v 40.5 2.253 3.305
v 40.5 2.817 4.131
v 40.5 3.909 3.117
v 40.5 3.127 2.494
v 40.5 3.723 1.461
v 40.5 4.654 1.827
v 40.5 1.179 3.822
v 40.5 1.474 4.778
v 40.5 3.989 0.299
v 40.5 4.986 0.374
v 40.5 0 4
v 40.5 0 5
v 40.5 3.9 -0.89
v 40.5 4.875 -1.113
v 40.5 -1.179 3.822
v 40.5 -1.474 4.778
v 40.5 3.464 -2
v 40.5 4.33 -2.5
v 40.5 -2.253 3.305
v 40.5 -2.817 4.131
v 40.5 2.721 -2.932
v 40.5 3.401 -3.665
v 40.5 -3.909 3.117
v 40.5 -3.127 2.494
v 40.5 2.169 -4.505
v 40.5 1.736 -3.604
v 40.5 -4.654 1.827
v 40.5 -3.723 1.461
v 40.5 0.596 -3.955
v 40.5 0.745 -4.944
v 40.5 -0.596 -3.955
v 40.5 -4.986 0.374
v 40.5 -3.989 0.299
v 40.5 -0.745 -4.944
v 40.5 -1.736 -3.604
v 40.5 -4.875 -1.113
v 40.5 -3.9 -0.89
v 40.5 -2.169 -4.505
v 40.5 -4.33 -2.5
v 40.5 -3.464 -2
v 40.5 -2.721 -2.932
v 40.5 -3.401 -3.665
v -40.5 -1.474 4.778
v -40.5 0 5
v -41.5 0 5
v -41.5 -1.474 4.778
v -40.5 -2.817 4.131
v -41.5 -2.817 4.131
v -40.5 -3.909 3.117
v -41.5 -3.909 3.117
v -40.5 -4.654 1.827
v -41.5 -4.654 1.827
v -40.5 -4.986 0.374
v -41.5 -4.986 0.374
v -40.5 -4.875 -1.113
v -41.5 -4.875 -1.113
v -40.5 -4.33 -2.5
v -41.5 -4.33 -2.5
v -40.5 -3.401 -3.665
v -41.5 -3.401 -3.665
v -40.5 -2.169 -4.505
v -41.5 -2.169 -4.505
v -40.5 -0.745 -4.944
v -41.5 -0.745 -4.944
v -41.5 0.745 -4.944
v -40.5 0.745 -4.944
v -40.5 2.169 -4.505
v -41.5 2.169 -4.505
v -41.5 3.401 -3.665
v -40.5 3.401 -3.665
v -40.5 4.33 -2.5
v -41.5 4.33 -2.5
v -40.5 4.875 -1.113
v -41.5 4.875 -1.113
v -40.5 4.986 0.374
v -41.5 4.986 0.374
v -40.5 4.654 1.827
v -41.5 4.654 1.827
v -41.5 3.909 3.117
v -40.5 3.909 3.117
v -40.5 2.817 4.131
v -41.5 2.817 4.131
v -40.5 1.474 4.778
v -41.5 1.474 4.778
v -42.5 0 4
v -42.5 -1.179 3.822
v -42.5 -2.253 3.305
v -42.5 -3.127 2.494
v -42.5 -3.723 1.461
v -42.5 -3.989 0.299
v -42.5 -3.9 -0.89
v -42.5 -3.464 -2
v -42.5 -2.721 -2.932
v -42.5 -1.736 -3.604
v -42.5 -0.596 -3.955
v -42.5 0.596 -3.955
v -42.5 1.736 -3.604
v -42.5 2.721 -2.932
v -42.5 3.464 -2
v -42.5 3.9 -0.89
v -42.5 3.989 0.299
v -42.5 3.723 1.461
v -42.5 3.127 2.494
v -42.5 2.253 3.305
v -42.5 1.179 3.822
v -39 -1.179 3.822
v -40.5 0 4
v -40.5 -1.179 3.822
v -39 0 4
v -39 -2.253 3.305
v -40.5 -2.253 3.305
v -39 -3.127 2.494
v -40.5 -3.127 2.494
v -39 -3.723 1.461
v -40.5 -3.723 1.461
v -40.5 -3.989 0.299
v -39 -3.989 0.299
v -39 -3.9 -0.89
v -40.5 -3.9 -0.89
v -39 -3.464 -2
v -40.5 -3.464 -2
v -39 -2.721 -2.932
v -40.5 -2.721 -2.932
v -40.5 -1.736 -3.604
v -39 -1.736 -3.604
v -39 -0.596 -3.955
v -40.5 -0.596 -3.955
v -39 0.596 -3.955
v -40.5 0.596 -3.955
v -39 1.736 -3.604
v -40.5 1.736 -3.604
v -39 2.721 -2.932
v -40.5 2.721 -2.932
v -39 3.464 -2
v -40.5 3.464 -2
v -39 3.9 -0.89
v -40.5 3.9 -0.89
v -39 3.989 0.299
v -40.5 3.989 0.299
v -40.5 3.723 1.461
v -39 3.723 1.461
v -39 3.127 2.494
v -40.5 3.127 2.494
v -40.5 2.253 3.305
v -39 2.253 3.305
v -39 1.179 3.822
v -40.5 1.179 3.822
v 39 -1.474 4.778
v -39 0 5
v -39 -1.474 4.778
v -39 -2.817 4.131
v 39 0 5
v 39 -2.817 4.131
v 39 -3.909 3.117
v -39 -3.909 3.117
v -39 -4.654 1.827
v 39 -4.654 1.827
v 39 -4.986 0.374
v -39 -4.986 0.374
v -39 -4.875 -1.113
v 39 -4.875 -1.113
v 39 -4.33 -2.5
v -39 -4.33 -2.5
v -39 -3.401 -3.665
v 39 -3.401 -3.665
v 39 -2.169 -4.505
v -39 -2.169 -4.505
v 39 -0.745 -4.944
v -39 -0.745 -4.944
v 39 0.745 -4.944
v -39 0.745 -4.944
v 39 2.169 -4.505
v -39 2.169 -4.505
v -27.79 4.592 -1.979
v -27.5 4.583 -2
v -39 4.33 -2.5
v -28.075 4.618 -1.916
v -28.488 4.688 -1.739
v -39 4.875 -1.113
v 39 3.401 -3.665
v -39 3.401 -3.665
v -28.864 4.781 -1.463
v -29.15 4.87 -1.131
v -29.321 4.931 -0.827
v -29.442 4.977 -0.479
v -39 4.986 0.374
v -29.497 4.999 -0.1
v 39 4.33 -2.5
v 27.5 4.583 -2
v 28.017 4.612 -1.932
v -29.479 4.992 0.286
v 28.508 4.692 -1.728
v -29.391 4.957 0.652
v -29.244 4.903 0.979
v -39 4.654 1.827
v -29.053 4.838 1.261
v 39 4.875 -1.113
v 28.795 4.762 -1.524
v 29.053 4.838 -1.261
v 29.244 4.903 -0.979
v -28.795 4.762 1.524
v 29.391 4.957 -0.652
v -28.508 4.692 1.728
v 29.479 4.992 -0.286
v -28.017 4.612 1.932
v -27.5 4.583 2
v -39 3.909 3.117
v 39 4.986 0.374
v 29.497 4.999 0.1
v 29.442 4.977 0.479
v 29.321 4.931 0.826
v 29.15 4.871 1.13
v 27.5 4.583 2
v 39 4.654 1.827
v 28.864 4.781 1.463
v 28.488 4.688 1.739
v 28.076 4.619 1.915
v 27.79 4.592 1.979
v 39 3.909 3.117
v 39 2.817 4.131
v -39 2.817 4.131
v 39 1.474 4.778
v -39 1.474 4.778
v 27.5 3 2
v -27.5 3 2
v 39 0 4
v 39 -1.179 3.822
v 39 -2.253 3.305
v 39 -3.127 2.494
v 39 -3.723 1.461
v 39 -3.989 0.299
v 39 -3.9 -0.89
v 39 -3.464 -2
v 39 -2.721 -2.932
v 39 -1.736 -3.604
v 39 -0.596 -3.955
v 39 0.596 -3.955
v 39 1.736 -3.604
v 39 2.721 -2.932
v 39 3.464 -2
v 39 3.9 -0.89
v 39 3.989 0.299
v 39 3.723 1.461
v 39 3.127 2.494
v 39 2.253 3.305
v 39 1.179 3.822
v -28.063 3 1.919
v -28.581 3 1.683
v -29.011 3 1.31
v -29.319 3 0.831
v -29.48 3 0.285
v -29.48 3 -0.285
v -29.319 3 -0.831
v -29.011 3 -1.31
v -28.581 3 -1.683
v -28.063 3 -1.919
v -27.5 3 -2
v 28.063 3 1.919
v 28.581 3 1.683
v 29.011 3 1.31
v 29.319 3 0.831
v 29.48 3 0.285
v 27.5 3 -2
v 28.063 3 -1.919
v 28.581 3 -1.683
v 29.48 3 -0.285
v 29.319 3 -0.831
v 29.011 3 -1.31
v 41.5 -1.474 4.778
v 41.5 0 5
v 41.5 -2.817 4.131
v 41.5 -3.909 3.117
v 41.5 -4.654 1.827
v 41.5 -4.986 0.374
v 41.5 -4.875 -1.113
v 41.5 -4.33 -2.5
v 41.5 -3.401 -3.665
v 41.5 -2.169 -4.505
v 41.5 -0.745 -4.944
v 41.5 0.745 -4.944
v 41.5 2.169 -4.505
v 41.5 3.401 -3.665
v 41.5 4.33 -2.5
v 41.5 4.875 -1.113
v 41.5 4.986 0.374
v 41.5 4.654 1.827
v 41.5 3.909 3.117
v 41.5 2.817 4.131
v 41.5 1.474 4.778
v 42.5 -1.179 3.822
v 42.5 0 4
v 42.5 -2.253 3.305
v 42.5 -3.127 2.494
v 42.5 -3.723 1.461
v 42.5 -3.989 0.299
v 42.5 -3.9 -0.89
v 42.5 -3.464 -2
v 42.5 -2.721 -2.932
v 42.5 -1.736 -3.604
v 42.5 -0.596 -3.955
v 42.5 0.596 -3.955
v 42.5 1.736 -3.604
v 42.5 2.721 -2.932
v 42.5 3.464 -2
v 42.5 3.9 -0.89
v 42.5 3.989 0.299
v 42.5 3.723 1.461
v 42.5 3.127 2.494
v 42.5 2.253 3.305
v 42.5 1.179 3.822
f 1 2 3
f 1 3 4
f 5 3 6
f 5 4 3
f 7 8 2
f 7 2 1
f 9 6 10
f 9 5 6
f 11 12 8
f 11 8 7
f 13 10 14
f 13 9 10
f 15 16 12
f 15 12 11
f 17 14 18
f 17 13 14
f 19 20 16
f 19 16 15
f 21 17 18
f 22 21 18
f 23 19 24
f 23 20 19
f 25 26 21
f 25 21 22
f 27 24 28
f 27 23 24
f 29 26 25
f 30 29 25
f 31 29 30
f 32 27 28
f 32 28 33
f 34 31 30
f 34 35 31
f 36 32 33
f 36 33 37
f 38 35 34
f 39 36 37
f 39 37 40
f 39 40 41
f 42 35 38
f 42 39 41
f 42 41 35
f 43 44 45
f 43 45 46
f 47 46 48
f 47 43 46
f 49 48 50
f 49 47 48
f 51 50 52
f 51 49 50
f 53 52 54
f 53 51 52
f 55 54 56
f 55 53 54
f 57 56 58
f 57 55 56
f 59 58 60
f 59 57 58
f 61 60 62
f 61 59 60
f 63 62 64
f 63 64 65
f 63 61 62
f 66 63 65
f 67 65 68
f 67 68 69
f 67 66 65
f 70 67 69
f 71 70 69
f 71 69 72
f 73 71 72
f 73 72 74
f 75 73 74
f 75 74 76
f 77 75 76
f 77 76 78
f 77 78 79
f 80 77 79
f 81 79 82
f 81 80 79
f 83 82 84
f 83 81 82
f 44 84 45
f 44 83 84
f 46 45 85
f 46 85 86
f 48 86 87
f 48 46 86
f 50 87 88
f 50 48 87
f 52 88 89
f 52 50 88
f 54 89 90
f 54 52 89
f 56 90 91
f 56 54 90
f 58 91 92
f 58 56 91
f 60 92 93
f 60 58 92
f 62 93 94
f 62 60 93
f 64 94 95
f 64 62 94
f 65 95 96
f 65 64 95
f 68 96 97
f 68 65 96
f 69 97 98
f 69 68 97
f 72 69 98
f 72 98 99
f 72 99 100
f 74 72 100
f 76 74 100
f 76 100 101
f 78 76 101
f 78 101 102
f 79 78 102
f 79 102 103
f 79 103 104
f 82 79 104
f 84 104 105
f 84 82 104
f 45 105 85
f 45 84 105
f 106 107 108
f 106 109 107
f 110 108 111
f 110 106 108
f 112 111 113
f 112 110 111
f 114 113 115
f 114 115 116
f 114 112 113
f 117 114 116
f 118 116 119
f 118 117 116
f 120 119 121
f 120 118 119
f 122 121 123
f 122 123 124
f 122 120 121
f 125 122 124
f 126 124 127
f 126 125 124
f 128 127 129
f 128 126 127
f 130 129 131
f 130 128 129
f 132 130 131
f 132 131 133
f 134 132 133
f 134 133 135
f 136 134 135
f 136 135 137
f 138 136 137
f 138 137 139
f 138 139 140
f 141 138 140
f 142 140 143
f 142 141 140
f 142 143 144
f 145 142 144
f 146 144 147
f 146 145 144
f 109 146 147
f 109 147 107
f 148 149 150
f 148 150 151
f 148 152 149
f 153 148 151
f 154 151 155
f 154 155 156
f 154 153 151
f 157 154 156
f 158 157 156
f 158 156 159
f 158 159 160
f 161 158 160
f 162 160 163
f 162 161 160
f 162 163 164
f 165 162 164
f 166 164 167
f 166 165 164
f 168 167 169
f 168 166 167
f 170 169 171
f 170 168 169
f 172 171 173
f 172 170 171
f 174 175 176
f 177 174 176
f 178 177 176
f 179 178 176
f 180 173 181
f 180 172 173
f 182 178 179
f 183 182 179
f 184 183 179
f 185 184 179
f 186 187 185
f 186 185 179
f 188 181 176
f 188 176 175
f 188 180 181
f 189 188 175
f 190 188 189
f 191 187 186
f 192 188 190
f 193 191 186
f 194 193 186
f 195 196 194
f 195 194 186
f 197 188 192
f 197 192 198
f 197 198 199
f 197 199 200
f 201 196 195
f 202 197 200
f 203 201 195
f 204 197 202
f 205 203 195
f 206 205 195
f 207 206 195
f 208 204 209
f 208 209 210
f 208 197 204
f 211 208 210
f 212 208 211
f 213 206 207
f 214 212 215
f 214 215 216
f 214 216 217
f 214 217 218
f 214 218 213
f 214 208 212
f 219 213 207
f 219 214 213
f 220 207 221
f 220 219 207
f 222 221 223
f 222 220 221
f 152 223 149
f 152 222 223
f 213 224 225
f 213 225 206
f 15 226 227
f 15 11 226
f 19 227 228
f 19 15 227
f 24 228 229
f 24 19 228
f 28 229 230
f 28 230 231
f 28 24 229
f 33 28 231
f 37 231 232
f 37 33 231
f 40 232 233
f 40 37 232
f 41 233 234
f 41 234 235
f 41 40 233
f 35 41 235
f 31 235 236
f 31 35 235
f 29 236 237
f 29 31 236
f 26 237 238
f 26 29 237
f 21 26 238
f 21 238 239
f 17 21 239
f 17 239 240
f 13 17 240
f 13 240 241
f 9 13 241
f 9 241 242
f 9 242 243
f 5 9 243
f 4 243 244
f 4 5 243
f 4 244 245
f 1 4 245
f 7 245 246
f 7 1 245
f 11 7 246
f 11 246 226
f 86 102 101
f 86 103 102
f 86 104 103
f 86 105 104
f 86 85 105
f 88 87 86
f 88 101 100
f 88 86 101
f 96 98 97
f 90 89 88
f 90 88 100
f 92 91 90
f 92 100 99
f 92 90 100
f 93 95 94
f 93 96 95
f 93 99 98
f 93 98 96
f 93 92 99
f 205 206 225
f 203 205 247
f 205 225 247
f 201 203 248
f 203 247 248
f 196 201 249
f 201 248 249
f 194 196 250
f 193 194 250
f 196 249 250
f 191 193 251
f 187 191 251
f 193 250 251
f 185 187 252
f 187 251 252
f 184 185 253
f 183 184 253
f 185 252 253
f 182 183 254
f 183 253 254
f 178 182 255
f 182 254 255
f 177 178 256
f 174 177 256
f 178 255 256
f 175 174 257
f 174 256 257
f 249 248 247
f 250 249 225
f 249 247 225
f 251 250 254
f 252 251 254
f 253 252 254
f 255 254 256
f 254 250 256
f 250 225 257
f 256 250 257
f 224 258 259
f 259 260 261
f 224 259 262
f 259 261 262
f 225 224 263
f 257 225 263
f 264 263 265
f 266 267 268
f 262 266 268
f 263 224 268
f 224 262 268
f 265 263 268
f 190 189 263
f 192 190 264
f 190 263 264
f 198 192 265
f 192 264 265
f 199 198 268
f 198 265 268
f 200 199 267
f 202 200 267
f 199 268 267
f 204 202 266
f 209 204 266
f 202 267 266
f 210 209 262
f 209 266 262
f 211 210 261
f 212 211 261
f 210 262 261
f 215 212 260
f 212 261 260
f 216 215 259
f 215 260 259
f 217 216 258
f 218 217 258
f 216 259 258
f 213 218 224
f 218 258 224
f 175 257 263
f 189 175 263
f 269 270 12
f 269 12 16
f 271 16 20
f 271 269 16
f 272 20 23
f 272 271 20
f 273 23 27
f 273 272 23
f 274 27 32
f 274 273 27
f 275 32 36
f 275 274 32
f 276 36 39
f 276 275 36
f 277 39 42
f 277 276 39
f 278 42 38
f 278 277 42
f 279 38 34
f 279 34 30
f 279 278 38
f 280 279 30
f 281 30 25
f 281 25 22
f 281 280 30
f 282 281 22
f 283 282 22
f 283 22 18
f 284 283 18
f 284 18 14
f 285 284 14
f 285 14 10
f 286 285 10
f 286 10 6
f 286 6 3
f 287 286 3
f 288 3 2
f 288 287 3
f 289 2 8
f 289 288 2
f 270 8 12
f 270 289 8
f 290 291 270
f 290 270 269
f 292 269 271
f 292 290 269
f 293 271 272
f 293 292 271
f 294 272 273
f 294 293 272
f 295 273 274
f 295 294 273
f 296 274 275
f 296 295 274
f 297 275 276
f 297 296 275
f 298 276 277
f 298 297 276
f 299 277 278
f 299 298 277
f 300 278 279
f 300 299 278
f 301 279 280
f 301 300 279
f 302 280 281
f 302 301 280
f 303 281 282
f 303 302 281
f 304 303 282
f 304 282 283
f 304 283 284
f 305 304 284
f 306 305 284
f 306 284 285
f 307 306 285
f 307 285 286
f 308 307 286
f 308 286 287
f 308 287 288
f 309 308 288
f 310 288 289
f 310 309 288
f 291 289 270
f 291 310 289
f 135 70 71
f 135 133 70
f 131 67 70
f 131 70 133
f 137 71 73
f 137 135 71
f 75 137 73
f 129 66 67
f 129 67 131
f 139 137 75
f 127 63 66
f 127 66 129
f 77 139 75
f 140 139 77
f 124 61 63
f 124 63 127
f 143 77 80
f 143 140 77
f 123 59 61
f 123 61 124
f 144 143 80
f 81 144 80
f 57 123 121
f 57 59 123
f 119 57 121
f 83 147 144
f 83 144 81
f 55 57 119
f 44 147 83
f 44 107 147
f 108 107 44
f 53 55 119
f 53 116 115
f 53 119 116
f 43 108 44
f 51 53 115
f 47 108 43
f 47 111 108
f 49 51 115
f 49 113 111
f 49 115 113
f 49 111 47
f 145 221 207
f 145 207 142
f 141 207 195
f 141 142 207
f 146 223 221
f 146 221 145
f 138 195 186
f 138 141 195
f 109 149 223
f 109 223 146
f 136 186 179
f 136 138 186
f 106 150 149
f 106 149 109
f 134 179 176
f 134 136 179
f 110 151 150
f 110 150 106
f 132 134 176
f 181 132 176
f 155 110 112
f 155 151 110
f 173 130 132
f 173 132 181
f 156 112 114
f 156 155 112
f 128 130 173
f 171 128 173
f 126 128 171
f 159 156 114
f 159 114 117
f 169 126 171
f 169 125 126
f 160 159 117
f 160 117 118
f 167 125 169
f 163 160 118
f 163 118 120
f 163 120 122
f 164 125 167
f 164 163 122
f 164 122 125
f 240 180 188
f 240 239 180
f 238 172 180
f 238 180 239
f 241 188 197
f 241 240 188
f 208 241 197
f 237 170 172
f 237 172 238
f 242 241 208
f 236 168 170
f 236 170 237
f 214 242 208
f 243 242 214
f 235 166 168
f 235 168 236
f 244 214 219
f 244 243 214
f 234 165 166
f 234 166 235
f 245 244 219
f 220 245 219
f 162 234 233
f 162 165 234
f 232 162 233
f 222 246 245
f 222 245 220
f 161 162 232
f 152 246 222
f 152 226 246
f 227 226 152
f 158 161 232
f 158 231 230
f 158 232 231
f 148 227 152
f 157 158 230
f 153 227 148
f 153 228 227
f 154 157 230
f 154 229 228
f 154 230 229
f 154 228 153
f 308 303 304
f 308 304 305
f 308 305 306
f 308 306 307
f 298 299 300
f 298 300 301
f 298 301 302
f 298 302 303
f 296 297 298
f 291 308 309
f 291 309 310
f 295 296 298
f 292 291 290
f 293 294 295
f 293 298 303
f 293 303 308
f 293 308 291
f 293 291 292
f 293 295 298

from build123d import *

# Parameters (mm, degrees)
CHAMFER1_SIZE      = 1
SKETCH3_W          = 4
SKETCH3_H          = 4
CUT_EXTRUDE1_DEPTH = 5
CUT_EXTRUDE2_DEPTH = 10


with BuildPart() as part:
    # Sketch1 → Revolve1 (revolve)
    with BuildSketch(Plane.XY, mode=Mode.PRIVATE) as revolve1_sk:
        Polygon((-42.5, 0), (-42.5, 5), (-40.5, 5), (-40.5, 4), (-39, 4), (-39, 5), (39, 5), (39, 4), (40.5, 4), (40.5, 5), (42.5, 5), (42.5, 0), align=None)
    revolve(revolve1_sk.sketch.rotate(Axis((-47.151991765, 0, 0), (1, 0, 0)), 90), axis=Axis((-47.151991765, 0, 0), (1, 0, 0)))

    # Chamfer1
    chamfer1_edges = [part.edges().sort_by_distance(p)[0] for p in [
        (42.5, 0, -5),
        (-42.5, 0, -5),
    ]]
    chamfer(chamfer1_edges, length=CHAMFER1_SIZE)

    # Sketch3 → Cut-Extrude1 (cut)
    with BuildSketch(Plane(origin=(0, 0, 0), x_dir=(0, 0, -1), z_dir=(1, 0, 0))):
        with Locations((0, 5)):
            Rectangle(SKETCH3_W, SKETCH3_H)
    extrude(amount=-CUT_EXTRUDE1_DEPTH, mode=Mode.SUBTRACT)

    # Sketch4 → Cut-Extrude2 (cut)
    with BuildSketch(Plane(origin=(0, 3, 0), x_dir=(1, 0, 0), z_dir=(0, 1, 0))):
        with BuildLine():
            Line((27.5, -2), (0, -2))
            Line((0, -2), (-27.5, -2))
            ThreePointArc((-27.5, -2), (-29.5, 0), (-27.5, 2))
            Line((-27.5, 2), (0, 2))
            Line((0, 2), (27.5, 2))
            ThreePointArc((27.5, 2), (29.5, 0), (27.5, -2))
        make_face()
    extrude(amount=CUT_EXTRUDE2_DEPTH, mode=Mode.SUBTRACT)


solid = part.part
